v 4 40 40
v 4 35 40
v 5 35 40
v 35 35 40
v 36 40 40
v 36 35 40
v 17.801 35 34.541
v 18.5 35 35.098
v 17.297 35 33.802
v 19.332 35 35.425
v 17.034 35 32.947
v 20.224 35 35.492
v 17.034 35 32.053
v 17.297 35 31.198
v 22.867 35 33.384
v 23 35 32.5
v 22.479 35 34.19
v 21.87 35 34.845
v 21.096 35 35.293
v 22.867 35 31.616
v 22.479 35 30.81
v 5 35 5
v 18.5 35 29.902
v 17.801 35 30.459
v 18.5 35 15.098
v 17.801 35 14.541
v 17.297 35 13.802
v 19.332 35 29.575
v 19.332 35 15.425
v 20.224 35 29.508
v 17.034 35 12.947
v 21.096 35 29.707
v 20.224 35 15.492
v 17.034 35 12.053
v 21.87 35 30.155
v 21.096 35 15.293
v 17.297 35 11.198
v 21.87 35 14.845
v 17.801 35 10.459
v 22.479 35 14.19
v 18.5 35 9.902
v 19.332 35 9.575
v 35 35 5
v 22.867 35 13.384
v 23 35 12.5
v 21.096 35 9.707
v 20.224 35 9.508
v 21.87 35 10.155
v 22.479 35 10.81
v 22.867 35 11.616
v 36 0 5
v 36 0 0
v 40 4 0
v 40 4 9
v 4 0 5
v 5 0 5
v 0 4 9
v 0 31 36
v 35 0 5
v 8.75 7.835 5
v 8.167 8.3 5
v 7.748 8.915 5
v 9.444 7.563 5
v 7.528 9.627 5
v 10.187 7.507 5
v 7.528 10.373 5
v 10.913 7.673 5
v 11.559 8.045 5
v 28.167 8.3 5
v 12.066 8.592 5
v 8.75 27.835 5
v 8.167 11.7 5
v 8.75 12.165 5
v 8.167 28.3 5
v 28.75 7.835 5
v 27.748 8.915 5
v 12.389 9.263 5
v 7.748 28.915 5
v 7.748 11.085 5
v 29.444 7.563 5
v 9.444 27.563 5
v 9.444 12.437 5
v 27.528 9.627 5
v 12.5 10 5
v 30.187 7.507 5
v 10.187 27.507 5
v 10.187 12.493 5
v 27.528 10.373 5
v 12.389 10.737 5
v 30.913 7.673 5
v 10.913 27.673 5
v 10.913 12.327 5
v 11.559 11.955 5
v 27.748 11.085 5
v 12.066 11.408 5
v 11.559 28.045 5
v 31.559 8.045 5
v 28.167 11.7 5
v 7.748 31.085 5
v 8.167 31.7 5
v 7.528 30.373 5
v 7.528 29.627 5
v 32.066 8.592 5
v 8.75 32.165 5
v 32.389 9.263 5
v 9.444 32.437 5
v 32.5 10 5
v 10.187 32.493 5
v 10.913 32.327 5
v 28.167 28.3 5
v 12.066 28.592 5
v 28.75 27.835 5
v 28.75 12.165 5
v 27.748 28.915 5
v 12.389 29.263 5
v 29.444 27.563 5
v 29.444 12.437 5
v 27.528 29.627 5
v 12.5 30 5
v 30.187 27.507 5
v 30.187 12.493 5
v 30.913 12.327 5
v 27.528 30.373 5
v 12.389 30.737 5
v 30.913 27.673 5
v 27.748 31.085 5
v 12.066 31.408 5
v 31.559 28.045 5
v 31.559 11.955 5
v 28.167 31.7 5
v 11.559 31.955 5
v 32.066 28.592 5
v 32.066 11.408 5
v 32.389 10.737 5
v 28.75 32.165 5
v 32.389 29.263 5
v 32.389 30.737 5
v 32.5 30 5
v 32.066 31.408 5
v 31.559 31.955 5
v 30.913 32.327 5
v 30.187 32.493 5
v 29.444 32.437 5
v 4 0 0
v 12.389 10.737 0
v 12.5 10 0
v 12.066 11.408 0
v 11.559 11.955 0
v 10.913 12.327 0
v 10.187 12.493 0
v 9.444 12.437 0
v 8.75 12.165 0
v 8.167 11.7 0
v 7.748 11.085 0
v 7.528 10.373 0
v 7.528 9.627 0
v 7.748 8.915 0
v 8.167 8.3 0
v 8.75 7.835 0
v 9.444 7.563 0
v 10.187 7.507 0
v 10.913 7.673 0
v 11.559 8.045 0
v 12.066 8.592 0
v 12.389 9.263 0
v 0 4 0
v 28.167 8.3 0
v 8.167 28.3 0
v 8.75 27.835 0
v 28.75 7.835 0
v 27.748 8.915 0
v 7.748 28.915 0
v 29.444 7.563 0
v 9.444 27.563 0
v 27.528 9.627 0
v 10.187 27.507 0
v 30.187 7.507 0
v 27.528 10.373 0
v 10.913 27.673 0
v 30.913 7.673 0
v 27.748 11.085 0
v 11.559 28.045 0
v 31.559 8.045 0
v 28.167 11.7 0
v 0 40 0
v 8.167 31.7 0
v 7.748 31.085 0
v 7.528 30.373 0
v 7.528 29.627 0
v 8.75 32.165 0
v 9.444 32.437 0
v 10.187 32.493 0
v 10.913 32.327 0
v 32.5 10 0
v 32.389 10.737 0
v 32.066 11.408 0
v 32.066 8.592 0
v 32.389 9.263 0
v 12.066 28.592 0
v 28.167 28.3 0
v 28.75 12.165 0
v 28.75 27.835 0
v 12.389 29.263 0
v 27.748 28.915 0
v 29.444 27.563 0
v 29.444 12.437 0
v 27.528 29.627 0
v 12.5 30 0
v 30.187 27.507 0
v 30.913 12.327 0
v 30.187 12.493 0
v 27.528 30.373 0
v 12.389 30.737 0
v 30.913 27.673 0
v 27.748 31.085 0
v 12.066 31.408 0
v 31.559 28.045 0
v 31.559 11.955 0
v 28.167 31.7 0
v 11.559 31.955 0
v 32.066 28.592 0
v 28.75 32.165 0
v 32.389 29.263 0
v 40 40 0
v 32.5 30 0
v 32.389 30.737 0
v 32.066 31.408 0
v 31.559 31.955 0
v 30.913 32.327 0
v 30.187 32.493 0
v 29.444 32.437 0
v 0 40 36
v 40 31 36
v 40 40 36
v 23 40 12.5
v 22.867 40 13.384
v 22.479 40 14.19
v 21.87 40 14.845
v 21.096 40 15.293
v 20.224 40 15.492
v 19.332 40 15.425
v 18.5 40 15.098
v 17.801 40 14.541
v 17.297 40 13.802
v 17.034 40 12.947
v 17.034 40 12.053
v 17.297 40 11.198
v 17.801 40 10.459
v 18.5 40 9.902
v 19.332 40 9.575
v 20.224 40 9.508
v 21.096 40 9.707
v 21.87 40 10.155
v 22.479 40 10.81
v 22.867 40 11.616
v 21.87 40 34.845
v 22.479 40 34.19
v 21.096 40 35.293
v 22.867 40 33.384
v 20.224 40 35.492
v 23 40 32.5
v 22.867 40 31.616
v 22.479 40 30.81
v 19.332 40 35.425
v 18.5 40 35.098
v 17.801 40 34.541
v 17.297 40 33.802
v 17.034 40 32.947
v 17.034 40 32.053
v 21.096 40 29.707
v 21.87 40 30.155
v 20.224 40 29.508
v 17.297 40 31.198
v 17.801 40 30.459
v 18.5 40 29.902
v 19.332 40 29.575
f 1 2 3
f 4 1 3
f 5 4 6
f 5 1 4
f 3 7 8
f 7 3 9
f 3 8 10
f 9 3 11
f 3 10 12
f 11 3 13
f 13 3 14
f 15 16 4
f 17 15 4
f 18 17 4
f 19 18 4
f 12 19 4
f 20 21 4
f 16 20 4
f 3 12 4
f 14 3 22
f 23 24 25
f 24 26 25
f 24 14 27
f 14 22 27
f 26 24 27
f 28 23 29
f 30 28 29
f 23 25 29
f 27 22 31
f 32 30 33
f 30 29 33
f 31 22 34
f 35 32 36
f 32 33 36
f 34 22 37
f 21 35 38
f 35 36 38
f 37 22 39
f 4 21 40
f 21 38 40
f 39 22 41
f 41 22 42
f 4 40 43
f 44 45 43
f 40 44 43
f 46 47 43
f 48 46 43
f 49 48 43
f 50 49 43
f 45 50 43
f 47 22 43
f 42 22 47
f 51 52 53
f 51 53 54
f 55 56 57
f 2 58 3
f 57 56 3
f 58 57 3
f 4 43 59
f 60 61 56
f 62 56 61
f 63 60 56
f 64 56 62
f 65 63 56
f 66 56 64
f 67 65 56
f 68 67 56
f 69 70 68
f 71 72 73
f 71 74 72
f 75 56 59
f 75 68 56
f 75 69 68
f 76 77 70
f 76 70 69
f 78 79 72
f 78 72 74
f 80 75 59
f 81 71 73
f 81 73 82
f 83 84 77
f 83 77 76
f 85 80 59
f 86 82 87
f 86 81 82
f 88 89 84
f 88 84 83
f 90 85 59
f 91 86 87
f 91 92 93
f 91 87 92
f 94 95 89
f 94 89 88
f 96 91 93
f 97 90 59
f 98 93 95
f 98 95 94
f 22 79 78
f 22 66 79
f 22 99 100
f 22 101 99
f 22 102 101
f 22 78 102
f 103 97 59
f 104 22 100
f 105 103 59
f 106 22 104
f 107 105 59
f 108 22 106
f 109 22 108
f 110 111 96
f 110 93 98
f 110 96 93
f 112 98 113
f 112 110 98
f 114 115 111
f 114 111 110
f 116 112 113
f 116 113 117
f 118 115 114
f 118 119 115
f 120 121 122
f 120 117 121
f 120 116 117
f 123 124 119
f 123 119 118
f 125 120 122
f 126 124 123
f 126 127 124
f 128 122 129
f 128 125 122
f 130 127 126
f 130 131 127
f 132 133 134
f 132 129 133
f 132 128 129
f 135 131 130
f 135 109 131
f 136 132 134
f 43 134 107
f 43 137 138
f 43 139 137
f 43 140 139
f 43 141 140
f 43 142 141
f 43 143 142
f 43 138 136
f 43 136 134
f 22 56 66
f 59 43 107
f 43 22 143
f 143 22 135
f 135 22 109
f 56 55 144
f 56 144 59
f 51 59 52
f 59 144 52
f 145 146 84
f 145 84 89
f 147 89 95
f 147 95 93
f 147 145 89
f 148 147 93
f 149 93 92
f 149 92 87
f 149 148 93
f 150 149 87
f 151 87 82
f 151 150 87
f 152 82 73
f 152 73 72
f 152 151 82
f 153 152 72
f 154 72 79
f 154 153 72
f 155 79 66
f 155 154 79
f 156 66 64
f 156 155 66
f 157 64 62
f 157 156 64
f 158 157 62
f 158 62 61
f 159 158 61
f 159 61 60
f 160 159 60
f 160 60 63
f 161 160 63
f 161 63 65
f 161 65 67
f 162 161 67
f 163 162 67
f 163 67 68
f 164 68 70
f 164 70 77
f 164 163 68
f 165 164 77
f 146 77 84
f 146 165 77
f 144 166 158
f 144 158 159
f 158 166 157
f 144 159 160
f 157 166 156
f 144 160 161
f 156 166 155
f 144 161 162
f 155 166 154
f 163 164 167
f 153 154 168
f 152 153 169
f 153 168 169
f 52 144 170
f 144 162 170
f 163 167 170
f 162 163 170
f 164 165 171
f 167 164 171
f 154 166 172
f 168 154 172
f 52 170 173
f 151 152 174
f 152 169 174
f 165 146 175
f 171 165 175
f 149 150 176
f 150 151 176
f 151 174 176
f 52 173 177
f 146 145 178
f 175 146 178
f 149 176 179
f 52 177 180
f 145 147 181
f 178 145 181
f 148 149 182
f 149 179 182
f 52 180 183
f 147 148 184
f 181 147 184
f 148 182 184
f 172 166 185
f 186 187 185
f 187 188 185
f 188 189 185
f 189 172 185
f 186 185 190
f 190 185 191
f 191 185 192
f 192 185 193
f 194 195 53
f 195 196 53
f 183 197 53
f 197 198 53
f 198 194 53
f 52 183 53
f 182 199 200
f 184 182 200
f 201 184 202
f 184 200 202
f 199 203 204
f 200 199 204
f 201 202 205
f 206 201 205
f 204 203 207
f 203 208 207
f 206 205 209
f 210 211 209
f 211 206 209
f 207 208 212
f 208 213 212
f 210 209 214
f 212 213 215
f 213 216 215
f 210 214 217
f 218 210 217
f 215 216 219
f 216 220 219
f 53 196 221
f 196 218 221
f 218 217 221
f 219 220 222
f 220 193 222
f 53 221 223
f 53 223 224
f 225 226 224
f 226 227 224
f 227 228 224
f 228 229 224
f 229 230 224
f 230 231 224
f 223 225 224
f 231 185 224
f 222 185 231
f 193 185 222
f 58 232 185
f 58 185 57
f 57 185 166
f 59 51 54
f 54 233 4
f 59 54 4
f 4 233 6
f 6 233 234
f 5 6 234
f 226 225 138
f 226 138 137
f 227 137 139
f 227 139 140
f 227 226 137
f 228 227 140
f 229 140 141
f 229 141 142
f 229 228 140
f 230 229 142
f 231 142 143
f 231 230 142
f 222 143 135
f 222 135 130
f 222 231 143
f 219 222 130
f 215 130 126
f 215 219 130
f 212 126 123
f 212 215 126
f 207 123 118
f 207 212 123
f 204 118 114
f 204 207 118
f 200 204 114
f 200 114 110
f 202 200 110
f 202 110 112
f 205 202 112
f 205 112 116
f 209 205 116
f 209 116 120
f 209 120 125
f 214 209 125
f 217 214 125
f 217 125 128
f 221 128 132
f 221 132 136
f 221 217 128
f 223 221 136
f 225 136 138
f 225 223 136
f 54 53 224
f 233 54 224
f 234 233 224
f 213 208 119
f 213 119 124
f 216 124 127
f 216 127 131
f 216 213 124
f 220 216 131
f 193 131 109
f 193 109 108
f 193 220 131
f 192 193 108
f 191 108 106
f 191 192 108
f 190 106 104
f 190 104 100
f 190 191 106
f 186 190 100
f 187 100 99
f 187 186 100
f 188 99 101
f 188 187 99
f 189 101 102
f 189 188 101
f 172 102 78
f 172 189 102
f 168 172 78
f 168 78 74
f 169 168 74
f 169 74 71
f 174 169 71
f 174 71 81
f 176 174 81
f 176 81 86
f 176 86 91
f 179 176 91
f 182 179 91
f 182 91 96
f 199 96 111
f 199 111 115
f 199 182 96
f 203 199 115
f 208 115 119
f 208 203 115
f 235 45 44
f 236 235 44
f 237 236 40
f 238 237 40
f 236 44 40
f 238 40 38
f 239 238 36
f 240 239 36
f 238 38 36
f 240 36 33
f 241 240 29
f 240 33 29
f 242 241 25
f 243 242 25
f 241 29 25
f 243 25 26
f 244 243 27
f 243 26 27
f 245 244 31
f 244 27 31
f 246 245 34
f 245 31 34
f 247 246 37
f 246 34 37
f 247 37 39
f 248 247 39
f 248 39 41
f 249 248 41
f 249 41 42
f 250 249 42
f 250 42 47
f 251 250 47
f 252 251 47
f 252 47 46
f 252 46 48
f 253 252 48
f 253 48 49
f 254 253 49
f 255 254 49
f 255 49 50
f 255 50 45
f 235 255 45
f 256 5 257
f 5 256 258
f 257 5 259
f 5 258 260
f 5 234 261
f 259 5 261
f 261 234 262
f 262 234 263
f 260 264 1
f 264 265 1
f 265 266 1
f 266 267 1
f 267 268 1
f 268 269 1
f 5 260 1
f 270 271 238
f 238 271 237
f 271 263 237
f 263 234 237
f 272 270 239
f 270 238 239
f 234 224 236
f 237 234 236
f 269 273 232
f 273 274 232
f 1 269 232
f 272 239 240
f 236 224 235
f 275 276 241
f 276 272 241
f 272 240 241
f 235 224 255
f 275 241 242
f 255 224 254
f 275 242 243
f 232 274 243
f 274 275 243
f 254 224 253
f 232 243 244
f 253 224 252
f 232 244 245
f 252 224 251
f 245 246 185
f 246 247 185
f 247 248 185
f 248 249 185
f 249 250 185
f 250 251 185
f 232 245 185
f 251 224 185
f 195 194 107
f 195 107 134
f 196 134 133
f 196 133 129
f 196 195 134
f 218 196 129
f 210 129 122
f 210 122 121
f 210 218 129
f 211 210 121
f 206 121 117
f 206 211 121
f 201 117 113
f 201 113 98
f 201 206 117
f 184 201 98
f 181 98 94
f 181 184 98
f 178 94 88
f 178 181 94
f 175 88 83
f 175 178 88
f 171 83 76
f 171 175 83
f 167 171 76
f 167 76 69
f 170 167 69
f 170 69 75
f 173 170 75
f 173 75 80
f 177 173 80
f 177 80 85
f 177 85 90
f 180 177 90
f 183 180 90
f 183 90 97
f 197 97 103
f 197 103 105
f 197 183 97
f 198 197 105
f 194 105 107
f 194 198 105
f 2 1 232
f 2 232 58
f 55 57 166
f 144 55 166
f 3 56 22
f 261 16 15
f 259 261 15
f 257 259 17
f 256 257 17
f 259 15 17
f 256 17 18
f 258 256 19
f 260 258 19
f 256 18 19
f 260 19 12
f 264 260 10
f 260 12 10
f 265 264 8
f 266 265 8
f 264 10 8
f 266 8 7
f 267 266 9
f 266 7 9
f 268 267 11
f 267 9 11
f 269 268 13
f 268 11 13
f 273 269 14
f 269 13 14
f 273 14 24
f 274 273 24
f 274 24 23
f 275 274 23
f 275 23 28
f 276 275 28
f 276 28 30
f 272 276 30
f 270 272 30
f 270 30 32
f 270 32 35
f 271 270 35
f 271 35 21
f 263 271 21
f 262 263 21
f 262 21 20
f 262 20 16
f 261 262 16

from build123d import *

# Parameters (mm, degrees)
SKETCH_W        = 40
SKETCH_H        = 40
SKETCH_R        = 2.5
PAD_DEPTH       = 5
PAD001_DEPTH    = 35
SKETCH002_R     = 3
POCKET_DEPTH    = 5.001
POCKET001_DEPTH = 40.001
CHAMFER_SIZE    = 4
CHAMFER001_SIZE = 4


with BuildPart() as part:
    # Sketch → Pad (new body)
    with BuildSketch(Plane.XY):
        with Locations((20, 20)):
            Rectangle(SKETCH_W, SKETCH_H)
        with Locations((10, 30)):
            Circle(SKETCH_R, mode=Mode.SUBTRACT)
        with Locations((30, 30)):
            Circle(SKETCH_R, mode=Mode.SUBTRACT)
        with Locations((30, 10)):
            Circle(SKETCH_R, mode=Mode.SUBTRACT)
        with Locations((10, 10)):
            Circle(SKETCH_R, mode=Mode.SUBTRACT)
    extrude(amount=PAD_DEPTH)

    # Sketch001 (on Face10 of Pad) → Pad001 (join)
    with BuildSketch(Plane.XY.offset(5)):
        Polygon((0, 0), (5, 0), (5, 35), (35, 35), (35, 0), (40, 0), (40, 40), (0, 40), align=None)
    extrude(amount=PAD001_DEPTH)

    # Sketch002 (on Face17 of Pad001) → Pocket (cut, through all)
    with BuildSketch(Plane.XZ.offset(-35)):
        with Locations((20, 32.5)):
            Circle(SKETCH002_R)
        with Locations((20, 12.5)):
            Circle(SKETCH002_R)
    extrude(amount=-POCKET_DEPTH, mode=Mode.SUBTRACT)

    # Sketch003 (on Face10 of Pocket) → Pocket001 (cut, through all)
    with BuildSketch(Plane.YZ.offset(40)):
        Polygon((0, 40), (0, 5), (35, 40), align=None)
    extrude(amount=-POCKET001_DEPTH, mode=Mode.SUBTRACT)

    # Chamfer
    chamfer_edges = [part.edges().sort_by_distance(p)[0] for p in [
        (40, 37.5, 40),
        (0, 37.5, 40),
    ]]
    chamfer(chamfer_edges, length=CHAMFER_SIZE)

    # Chamfer001
    chamfer001_edges = [part.edges().sort_by_distance(p)[0] for p in [
        (40, 0, 2.5),
        (0, 0, 2.5),
    ]]
    chamfer(chamfer001_edges, length=CHAMFER001_SIZE)


solid = part.part
